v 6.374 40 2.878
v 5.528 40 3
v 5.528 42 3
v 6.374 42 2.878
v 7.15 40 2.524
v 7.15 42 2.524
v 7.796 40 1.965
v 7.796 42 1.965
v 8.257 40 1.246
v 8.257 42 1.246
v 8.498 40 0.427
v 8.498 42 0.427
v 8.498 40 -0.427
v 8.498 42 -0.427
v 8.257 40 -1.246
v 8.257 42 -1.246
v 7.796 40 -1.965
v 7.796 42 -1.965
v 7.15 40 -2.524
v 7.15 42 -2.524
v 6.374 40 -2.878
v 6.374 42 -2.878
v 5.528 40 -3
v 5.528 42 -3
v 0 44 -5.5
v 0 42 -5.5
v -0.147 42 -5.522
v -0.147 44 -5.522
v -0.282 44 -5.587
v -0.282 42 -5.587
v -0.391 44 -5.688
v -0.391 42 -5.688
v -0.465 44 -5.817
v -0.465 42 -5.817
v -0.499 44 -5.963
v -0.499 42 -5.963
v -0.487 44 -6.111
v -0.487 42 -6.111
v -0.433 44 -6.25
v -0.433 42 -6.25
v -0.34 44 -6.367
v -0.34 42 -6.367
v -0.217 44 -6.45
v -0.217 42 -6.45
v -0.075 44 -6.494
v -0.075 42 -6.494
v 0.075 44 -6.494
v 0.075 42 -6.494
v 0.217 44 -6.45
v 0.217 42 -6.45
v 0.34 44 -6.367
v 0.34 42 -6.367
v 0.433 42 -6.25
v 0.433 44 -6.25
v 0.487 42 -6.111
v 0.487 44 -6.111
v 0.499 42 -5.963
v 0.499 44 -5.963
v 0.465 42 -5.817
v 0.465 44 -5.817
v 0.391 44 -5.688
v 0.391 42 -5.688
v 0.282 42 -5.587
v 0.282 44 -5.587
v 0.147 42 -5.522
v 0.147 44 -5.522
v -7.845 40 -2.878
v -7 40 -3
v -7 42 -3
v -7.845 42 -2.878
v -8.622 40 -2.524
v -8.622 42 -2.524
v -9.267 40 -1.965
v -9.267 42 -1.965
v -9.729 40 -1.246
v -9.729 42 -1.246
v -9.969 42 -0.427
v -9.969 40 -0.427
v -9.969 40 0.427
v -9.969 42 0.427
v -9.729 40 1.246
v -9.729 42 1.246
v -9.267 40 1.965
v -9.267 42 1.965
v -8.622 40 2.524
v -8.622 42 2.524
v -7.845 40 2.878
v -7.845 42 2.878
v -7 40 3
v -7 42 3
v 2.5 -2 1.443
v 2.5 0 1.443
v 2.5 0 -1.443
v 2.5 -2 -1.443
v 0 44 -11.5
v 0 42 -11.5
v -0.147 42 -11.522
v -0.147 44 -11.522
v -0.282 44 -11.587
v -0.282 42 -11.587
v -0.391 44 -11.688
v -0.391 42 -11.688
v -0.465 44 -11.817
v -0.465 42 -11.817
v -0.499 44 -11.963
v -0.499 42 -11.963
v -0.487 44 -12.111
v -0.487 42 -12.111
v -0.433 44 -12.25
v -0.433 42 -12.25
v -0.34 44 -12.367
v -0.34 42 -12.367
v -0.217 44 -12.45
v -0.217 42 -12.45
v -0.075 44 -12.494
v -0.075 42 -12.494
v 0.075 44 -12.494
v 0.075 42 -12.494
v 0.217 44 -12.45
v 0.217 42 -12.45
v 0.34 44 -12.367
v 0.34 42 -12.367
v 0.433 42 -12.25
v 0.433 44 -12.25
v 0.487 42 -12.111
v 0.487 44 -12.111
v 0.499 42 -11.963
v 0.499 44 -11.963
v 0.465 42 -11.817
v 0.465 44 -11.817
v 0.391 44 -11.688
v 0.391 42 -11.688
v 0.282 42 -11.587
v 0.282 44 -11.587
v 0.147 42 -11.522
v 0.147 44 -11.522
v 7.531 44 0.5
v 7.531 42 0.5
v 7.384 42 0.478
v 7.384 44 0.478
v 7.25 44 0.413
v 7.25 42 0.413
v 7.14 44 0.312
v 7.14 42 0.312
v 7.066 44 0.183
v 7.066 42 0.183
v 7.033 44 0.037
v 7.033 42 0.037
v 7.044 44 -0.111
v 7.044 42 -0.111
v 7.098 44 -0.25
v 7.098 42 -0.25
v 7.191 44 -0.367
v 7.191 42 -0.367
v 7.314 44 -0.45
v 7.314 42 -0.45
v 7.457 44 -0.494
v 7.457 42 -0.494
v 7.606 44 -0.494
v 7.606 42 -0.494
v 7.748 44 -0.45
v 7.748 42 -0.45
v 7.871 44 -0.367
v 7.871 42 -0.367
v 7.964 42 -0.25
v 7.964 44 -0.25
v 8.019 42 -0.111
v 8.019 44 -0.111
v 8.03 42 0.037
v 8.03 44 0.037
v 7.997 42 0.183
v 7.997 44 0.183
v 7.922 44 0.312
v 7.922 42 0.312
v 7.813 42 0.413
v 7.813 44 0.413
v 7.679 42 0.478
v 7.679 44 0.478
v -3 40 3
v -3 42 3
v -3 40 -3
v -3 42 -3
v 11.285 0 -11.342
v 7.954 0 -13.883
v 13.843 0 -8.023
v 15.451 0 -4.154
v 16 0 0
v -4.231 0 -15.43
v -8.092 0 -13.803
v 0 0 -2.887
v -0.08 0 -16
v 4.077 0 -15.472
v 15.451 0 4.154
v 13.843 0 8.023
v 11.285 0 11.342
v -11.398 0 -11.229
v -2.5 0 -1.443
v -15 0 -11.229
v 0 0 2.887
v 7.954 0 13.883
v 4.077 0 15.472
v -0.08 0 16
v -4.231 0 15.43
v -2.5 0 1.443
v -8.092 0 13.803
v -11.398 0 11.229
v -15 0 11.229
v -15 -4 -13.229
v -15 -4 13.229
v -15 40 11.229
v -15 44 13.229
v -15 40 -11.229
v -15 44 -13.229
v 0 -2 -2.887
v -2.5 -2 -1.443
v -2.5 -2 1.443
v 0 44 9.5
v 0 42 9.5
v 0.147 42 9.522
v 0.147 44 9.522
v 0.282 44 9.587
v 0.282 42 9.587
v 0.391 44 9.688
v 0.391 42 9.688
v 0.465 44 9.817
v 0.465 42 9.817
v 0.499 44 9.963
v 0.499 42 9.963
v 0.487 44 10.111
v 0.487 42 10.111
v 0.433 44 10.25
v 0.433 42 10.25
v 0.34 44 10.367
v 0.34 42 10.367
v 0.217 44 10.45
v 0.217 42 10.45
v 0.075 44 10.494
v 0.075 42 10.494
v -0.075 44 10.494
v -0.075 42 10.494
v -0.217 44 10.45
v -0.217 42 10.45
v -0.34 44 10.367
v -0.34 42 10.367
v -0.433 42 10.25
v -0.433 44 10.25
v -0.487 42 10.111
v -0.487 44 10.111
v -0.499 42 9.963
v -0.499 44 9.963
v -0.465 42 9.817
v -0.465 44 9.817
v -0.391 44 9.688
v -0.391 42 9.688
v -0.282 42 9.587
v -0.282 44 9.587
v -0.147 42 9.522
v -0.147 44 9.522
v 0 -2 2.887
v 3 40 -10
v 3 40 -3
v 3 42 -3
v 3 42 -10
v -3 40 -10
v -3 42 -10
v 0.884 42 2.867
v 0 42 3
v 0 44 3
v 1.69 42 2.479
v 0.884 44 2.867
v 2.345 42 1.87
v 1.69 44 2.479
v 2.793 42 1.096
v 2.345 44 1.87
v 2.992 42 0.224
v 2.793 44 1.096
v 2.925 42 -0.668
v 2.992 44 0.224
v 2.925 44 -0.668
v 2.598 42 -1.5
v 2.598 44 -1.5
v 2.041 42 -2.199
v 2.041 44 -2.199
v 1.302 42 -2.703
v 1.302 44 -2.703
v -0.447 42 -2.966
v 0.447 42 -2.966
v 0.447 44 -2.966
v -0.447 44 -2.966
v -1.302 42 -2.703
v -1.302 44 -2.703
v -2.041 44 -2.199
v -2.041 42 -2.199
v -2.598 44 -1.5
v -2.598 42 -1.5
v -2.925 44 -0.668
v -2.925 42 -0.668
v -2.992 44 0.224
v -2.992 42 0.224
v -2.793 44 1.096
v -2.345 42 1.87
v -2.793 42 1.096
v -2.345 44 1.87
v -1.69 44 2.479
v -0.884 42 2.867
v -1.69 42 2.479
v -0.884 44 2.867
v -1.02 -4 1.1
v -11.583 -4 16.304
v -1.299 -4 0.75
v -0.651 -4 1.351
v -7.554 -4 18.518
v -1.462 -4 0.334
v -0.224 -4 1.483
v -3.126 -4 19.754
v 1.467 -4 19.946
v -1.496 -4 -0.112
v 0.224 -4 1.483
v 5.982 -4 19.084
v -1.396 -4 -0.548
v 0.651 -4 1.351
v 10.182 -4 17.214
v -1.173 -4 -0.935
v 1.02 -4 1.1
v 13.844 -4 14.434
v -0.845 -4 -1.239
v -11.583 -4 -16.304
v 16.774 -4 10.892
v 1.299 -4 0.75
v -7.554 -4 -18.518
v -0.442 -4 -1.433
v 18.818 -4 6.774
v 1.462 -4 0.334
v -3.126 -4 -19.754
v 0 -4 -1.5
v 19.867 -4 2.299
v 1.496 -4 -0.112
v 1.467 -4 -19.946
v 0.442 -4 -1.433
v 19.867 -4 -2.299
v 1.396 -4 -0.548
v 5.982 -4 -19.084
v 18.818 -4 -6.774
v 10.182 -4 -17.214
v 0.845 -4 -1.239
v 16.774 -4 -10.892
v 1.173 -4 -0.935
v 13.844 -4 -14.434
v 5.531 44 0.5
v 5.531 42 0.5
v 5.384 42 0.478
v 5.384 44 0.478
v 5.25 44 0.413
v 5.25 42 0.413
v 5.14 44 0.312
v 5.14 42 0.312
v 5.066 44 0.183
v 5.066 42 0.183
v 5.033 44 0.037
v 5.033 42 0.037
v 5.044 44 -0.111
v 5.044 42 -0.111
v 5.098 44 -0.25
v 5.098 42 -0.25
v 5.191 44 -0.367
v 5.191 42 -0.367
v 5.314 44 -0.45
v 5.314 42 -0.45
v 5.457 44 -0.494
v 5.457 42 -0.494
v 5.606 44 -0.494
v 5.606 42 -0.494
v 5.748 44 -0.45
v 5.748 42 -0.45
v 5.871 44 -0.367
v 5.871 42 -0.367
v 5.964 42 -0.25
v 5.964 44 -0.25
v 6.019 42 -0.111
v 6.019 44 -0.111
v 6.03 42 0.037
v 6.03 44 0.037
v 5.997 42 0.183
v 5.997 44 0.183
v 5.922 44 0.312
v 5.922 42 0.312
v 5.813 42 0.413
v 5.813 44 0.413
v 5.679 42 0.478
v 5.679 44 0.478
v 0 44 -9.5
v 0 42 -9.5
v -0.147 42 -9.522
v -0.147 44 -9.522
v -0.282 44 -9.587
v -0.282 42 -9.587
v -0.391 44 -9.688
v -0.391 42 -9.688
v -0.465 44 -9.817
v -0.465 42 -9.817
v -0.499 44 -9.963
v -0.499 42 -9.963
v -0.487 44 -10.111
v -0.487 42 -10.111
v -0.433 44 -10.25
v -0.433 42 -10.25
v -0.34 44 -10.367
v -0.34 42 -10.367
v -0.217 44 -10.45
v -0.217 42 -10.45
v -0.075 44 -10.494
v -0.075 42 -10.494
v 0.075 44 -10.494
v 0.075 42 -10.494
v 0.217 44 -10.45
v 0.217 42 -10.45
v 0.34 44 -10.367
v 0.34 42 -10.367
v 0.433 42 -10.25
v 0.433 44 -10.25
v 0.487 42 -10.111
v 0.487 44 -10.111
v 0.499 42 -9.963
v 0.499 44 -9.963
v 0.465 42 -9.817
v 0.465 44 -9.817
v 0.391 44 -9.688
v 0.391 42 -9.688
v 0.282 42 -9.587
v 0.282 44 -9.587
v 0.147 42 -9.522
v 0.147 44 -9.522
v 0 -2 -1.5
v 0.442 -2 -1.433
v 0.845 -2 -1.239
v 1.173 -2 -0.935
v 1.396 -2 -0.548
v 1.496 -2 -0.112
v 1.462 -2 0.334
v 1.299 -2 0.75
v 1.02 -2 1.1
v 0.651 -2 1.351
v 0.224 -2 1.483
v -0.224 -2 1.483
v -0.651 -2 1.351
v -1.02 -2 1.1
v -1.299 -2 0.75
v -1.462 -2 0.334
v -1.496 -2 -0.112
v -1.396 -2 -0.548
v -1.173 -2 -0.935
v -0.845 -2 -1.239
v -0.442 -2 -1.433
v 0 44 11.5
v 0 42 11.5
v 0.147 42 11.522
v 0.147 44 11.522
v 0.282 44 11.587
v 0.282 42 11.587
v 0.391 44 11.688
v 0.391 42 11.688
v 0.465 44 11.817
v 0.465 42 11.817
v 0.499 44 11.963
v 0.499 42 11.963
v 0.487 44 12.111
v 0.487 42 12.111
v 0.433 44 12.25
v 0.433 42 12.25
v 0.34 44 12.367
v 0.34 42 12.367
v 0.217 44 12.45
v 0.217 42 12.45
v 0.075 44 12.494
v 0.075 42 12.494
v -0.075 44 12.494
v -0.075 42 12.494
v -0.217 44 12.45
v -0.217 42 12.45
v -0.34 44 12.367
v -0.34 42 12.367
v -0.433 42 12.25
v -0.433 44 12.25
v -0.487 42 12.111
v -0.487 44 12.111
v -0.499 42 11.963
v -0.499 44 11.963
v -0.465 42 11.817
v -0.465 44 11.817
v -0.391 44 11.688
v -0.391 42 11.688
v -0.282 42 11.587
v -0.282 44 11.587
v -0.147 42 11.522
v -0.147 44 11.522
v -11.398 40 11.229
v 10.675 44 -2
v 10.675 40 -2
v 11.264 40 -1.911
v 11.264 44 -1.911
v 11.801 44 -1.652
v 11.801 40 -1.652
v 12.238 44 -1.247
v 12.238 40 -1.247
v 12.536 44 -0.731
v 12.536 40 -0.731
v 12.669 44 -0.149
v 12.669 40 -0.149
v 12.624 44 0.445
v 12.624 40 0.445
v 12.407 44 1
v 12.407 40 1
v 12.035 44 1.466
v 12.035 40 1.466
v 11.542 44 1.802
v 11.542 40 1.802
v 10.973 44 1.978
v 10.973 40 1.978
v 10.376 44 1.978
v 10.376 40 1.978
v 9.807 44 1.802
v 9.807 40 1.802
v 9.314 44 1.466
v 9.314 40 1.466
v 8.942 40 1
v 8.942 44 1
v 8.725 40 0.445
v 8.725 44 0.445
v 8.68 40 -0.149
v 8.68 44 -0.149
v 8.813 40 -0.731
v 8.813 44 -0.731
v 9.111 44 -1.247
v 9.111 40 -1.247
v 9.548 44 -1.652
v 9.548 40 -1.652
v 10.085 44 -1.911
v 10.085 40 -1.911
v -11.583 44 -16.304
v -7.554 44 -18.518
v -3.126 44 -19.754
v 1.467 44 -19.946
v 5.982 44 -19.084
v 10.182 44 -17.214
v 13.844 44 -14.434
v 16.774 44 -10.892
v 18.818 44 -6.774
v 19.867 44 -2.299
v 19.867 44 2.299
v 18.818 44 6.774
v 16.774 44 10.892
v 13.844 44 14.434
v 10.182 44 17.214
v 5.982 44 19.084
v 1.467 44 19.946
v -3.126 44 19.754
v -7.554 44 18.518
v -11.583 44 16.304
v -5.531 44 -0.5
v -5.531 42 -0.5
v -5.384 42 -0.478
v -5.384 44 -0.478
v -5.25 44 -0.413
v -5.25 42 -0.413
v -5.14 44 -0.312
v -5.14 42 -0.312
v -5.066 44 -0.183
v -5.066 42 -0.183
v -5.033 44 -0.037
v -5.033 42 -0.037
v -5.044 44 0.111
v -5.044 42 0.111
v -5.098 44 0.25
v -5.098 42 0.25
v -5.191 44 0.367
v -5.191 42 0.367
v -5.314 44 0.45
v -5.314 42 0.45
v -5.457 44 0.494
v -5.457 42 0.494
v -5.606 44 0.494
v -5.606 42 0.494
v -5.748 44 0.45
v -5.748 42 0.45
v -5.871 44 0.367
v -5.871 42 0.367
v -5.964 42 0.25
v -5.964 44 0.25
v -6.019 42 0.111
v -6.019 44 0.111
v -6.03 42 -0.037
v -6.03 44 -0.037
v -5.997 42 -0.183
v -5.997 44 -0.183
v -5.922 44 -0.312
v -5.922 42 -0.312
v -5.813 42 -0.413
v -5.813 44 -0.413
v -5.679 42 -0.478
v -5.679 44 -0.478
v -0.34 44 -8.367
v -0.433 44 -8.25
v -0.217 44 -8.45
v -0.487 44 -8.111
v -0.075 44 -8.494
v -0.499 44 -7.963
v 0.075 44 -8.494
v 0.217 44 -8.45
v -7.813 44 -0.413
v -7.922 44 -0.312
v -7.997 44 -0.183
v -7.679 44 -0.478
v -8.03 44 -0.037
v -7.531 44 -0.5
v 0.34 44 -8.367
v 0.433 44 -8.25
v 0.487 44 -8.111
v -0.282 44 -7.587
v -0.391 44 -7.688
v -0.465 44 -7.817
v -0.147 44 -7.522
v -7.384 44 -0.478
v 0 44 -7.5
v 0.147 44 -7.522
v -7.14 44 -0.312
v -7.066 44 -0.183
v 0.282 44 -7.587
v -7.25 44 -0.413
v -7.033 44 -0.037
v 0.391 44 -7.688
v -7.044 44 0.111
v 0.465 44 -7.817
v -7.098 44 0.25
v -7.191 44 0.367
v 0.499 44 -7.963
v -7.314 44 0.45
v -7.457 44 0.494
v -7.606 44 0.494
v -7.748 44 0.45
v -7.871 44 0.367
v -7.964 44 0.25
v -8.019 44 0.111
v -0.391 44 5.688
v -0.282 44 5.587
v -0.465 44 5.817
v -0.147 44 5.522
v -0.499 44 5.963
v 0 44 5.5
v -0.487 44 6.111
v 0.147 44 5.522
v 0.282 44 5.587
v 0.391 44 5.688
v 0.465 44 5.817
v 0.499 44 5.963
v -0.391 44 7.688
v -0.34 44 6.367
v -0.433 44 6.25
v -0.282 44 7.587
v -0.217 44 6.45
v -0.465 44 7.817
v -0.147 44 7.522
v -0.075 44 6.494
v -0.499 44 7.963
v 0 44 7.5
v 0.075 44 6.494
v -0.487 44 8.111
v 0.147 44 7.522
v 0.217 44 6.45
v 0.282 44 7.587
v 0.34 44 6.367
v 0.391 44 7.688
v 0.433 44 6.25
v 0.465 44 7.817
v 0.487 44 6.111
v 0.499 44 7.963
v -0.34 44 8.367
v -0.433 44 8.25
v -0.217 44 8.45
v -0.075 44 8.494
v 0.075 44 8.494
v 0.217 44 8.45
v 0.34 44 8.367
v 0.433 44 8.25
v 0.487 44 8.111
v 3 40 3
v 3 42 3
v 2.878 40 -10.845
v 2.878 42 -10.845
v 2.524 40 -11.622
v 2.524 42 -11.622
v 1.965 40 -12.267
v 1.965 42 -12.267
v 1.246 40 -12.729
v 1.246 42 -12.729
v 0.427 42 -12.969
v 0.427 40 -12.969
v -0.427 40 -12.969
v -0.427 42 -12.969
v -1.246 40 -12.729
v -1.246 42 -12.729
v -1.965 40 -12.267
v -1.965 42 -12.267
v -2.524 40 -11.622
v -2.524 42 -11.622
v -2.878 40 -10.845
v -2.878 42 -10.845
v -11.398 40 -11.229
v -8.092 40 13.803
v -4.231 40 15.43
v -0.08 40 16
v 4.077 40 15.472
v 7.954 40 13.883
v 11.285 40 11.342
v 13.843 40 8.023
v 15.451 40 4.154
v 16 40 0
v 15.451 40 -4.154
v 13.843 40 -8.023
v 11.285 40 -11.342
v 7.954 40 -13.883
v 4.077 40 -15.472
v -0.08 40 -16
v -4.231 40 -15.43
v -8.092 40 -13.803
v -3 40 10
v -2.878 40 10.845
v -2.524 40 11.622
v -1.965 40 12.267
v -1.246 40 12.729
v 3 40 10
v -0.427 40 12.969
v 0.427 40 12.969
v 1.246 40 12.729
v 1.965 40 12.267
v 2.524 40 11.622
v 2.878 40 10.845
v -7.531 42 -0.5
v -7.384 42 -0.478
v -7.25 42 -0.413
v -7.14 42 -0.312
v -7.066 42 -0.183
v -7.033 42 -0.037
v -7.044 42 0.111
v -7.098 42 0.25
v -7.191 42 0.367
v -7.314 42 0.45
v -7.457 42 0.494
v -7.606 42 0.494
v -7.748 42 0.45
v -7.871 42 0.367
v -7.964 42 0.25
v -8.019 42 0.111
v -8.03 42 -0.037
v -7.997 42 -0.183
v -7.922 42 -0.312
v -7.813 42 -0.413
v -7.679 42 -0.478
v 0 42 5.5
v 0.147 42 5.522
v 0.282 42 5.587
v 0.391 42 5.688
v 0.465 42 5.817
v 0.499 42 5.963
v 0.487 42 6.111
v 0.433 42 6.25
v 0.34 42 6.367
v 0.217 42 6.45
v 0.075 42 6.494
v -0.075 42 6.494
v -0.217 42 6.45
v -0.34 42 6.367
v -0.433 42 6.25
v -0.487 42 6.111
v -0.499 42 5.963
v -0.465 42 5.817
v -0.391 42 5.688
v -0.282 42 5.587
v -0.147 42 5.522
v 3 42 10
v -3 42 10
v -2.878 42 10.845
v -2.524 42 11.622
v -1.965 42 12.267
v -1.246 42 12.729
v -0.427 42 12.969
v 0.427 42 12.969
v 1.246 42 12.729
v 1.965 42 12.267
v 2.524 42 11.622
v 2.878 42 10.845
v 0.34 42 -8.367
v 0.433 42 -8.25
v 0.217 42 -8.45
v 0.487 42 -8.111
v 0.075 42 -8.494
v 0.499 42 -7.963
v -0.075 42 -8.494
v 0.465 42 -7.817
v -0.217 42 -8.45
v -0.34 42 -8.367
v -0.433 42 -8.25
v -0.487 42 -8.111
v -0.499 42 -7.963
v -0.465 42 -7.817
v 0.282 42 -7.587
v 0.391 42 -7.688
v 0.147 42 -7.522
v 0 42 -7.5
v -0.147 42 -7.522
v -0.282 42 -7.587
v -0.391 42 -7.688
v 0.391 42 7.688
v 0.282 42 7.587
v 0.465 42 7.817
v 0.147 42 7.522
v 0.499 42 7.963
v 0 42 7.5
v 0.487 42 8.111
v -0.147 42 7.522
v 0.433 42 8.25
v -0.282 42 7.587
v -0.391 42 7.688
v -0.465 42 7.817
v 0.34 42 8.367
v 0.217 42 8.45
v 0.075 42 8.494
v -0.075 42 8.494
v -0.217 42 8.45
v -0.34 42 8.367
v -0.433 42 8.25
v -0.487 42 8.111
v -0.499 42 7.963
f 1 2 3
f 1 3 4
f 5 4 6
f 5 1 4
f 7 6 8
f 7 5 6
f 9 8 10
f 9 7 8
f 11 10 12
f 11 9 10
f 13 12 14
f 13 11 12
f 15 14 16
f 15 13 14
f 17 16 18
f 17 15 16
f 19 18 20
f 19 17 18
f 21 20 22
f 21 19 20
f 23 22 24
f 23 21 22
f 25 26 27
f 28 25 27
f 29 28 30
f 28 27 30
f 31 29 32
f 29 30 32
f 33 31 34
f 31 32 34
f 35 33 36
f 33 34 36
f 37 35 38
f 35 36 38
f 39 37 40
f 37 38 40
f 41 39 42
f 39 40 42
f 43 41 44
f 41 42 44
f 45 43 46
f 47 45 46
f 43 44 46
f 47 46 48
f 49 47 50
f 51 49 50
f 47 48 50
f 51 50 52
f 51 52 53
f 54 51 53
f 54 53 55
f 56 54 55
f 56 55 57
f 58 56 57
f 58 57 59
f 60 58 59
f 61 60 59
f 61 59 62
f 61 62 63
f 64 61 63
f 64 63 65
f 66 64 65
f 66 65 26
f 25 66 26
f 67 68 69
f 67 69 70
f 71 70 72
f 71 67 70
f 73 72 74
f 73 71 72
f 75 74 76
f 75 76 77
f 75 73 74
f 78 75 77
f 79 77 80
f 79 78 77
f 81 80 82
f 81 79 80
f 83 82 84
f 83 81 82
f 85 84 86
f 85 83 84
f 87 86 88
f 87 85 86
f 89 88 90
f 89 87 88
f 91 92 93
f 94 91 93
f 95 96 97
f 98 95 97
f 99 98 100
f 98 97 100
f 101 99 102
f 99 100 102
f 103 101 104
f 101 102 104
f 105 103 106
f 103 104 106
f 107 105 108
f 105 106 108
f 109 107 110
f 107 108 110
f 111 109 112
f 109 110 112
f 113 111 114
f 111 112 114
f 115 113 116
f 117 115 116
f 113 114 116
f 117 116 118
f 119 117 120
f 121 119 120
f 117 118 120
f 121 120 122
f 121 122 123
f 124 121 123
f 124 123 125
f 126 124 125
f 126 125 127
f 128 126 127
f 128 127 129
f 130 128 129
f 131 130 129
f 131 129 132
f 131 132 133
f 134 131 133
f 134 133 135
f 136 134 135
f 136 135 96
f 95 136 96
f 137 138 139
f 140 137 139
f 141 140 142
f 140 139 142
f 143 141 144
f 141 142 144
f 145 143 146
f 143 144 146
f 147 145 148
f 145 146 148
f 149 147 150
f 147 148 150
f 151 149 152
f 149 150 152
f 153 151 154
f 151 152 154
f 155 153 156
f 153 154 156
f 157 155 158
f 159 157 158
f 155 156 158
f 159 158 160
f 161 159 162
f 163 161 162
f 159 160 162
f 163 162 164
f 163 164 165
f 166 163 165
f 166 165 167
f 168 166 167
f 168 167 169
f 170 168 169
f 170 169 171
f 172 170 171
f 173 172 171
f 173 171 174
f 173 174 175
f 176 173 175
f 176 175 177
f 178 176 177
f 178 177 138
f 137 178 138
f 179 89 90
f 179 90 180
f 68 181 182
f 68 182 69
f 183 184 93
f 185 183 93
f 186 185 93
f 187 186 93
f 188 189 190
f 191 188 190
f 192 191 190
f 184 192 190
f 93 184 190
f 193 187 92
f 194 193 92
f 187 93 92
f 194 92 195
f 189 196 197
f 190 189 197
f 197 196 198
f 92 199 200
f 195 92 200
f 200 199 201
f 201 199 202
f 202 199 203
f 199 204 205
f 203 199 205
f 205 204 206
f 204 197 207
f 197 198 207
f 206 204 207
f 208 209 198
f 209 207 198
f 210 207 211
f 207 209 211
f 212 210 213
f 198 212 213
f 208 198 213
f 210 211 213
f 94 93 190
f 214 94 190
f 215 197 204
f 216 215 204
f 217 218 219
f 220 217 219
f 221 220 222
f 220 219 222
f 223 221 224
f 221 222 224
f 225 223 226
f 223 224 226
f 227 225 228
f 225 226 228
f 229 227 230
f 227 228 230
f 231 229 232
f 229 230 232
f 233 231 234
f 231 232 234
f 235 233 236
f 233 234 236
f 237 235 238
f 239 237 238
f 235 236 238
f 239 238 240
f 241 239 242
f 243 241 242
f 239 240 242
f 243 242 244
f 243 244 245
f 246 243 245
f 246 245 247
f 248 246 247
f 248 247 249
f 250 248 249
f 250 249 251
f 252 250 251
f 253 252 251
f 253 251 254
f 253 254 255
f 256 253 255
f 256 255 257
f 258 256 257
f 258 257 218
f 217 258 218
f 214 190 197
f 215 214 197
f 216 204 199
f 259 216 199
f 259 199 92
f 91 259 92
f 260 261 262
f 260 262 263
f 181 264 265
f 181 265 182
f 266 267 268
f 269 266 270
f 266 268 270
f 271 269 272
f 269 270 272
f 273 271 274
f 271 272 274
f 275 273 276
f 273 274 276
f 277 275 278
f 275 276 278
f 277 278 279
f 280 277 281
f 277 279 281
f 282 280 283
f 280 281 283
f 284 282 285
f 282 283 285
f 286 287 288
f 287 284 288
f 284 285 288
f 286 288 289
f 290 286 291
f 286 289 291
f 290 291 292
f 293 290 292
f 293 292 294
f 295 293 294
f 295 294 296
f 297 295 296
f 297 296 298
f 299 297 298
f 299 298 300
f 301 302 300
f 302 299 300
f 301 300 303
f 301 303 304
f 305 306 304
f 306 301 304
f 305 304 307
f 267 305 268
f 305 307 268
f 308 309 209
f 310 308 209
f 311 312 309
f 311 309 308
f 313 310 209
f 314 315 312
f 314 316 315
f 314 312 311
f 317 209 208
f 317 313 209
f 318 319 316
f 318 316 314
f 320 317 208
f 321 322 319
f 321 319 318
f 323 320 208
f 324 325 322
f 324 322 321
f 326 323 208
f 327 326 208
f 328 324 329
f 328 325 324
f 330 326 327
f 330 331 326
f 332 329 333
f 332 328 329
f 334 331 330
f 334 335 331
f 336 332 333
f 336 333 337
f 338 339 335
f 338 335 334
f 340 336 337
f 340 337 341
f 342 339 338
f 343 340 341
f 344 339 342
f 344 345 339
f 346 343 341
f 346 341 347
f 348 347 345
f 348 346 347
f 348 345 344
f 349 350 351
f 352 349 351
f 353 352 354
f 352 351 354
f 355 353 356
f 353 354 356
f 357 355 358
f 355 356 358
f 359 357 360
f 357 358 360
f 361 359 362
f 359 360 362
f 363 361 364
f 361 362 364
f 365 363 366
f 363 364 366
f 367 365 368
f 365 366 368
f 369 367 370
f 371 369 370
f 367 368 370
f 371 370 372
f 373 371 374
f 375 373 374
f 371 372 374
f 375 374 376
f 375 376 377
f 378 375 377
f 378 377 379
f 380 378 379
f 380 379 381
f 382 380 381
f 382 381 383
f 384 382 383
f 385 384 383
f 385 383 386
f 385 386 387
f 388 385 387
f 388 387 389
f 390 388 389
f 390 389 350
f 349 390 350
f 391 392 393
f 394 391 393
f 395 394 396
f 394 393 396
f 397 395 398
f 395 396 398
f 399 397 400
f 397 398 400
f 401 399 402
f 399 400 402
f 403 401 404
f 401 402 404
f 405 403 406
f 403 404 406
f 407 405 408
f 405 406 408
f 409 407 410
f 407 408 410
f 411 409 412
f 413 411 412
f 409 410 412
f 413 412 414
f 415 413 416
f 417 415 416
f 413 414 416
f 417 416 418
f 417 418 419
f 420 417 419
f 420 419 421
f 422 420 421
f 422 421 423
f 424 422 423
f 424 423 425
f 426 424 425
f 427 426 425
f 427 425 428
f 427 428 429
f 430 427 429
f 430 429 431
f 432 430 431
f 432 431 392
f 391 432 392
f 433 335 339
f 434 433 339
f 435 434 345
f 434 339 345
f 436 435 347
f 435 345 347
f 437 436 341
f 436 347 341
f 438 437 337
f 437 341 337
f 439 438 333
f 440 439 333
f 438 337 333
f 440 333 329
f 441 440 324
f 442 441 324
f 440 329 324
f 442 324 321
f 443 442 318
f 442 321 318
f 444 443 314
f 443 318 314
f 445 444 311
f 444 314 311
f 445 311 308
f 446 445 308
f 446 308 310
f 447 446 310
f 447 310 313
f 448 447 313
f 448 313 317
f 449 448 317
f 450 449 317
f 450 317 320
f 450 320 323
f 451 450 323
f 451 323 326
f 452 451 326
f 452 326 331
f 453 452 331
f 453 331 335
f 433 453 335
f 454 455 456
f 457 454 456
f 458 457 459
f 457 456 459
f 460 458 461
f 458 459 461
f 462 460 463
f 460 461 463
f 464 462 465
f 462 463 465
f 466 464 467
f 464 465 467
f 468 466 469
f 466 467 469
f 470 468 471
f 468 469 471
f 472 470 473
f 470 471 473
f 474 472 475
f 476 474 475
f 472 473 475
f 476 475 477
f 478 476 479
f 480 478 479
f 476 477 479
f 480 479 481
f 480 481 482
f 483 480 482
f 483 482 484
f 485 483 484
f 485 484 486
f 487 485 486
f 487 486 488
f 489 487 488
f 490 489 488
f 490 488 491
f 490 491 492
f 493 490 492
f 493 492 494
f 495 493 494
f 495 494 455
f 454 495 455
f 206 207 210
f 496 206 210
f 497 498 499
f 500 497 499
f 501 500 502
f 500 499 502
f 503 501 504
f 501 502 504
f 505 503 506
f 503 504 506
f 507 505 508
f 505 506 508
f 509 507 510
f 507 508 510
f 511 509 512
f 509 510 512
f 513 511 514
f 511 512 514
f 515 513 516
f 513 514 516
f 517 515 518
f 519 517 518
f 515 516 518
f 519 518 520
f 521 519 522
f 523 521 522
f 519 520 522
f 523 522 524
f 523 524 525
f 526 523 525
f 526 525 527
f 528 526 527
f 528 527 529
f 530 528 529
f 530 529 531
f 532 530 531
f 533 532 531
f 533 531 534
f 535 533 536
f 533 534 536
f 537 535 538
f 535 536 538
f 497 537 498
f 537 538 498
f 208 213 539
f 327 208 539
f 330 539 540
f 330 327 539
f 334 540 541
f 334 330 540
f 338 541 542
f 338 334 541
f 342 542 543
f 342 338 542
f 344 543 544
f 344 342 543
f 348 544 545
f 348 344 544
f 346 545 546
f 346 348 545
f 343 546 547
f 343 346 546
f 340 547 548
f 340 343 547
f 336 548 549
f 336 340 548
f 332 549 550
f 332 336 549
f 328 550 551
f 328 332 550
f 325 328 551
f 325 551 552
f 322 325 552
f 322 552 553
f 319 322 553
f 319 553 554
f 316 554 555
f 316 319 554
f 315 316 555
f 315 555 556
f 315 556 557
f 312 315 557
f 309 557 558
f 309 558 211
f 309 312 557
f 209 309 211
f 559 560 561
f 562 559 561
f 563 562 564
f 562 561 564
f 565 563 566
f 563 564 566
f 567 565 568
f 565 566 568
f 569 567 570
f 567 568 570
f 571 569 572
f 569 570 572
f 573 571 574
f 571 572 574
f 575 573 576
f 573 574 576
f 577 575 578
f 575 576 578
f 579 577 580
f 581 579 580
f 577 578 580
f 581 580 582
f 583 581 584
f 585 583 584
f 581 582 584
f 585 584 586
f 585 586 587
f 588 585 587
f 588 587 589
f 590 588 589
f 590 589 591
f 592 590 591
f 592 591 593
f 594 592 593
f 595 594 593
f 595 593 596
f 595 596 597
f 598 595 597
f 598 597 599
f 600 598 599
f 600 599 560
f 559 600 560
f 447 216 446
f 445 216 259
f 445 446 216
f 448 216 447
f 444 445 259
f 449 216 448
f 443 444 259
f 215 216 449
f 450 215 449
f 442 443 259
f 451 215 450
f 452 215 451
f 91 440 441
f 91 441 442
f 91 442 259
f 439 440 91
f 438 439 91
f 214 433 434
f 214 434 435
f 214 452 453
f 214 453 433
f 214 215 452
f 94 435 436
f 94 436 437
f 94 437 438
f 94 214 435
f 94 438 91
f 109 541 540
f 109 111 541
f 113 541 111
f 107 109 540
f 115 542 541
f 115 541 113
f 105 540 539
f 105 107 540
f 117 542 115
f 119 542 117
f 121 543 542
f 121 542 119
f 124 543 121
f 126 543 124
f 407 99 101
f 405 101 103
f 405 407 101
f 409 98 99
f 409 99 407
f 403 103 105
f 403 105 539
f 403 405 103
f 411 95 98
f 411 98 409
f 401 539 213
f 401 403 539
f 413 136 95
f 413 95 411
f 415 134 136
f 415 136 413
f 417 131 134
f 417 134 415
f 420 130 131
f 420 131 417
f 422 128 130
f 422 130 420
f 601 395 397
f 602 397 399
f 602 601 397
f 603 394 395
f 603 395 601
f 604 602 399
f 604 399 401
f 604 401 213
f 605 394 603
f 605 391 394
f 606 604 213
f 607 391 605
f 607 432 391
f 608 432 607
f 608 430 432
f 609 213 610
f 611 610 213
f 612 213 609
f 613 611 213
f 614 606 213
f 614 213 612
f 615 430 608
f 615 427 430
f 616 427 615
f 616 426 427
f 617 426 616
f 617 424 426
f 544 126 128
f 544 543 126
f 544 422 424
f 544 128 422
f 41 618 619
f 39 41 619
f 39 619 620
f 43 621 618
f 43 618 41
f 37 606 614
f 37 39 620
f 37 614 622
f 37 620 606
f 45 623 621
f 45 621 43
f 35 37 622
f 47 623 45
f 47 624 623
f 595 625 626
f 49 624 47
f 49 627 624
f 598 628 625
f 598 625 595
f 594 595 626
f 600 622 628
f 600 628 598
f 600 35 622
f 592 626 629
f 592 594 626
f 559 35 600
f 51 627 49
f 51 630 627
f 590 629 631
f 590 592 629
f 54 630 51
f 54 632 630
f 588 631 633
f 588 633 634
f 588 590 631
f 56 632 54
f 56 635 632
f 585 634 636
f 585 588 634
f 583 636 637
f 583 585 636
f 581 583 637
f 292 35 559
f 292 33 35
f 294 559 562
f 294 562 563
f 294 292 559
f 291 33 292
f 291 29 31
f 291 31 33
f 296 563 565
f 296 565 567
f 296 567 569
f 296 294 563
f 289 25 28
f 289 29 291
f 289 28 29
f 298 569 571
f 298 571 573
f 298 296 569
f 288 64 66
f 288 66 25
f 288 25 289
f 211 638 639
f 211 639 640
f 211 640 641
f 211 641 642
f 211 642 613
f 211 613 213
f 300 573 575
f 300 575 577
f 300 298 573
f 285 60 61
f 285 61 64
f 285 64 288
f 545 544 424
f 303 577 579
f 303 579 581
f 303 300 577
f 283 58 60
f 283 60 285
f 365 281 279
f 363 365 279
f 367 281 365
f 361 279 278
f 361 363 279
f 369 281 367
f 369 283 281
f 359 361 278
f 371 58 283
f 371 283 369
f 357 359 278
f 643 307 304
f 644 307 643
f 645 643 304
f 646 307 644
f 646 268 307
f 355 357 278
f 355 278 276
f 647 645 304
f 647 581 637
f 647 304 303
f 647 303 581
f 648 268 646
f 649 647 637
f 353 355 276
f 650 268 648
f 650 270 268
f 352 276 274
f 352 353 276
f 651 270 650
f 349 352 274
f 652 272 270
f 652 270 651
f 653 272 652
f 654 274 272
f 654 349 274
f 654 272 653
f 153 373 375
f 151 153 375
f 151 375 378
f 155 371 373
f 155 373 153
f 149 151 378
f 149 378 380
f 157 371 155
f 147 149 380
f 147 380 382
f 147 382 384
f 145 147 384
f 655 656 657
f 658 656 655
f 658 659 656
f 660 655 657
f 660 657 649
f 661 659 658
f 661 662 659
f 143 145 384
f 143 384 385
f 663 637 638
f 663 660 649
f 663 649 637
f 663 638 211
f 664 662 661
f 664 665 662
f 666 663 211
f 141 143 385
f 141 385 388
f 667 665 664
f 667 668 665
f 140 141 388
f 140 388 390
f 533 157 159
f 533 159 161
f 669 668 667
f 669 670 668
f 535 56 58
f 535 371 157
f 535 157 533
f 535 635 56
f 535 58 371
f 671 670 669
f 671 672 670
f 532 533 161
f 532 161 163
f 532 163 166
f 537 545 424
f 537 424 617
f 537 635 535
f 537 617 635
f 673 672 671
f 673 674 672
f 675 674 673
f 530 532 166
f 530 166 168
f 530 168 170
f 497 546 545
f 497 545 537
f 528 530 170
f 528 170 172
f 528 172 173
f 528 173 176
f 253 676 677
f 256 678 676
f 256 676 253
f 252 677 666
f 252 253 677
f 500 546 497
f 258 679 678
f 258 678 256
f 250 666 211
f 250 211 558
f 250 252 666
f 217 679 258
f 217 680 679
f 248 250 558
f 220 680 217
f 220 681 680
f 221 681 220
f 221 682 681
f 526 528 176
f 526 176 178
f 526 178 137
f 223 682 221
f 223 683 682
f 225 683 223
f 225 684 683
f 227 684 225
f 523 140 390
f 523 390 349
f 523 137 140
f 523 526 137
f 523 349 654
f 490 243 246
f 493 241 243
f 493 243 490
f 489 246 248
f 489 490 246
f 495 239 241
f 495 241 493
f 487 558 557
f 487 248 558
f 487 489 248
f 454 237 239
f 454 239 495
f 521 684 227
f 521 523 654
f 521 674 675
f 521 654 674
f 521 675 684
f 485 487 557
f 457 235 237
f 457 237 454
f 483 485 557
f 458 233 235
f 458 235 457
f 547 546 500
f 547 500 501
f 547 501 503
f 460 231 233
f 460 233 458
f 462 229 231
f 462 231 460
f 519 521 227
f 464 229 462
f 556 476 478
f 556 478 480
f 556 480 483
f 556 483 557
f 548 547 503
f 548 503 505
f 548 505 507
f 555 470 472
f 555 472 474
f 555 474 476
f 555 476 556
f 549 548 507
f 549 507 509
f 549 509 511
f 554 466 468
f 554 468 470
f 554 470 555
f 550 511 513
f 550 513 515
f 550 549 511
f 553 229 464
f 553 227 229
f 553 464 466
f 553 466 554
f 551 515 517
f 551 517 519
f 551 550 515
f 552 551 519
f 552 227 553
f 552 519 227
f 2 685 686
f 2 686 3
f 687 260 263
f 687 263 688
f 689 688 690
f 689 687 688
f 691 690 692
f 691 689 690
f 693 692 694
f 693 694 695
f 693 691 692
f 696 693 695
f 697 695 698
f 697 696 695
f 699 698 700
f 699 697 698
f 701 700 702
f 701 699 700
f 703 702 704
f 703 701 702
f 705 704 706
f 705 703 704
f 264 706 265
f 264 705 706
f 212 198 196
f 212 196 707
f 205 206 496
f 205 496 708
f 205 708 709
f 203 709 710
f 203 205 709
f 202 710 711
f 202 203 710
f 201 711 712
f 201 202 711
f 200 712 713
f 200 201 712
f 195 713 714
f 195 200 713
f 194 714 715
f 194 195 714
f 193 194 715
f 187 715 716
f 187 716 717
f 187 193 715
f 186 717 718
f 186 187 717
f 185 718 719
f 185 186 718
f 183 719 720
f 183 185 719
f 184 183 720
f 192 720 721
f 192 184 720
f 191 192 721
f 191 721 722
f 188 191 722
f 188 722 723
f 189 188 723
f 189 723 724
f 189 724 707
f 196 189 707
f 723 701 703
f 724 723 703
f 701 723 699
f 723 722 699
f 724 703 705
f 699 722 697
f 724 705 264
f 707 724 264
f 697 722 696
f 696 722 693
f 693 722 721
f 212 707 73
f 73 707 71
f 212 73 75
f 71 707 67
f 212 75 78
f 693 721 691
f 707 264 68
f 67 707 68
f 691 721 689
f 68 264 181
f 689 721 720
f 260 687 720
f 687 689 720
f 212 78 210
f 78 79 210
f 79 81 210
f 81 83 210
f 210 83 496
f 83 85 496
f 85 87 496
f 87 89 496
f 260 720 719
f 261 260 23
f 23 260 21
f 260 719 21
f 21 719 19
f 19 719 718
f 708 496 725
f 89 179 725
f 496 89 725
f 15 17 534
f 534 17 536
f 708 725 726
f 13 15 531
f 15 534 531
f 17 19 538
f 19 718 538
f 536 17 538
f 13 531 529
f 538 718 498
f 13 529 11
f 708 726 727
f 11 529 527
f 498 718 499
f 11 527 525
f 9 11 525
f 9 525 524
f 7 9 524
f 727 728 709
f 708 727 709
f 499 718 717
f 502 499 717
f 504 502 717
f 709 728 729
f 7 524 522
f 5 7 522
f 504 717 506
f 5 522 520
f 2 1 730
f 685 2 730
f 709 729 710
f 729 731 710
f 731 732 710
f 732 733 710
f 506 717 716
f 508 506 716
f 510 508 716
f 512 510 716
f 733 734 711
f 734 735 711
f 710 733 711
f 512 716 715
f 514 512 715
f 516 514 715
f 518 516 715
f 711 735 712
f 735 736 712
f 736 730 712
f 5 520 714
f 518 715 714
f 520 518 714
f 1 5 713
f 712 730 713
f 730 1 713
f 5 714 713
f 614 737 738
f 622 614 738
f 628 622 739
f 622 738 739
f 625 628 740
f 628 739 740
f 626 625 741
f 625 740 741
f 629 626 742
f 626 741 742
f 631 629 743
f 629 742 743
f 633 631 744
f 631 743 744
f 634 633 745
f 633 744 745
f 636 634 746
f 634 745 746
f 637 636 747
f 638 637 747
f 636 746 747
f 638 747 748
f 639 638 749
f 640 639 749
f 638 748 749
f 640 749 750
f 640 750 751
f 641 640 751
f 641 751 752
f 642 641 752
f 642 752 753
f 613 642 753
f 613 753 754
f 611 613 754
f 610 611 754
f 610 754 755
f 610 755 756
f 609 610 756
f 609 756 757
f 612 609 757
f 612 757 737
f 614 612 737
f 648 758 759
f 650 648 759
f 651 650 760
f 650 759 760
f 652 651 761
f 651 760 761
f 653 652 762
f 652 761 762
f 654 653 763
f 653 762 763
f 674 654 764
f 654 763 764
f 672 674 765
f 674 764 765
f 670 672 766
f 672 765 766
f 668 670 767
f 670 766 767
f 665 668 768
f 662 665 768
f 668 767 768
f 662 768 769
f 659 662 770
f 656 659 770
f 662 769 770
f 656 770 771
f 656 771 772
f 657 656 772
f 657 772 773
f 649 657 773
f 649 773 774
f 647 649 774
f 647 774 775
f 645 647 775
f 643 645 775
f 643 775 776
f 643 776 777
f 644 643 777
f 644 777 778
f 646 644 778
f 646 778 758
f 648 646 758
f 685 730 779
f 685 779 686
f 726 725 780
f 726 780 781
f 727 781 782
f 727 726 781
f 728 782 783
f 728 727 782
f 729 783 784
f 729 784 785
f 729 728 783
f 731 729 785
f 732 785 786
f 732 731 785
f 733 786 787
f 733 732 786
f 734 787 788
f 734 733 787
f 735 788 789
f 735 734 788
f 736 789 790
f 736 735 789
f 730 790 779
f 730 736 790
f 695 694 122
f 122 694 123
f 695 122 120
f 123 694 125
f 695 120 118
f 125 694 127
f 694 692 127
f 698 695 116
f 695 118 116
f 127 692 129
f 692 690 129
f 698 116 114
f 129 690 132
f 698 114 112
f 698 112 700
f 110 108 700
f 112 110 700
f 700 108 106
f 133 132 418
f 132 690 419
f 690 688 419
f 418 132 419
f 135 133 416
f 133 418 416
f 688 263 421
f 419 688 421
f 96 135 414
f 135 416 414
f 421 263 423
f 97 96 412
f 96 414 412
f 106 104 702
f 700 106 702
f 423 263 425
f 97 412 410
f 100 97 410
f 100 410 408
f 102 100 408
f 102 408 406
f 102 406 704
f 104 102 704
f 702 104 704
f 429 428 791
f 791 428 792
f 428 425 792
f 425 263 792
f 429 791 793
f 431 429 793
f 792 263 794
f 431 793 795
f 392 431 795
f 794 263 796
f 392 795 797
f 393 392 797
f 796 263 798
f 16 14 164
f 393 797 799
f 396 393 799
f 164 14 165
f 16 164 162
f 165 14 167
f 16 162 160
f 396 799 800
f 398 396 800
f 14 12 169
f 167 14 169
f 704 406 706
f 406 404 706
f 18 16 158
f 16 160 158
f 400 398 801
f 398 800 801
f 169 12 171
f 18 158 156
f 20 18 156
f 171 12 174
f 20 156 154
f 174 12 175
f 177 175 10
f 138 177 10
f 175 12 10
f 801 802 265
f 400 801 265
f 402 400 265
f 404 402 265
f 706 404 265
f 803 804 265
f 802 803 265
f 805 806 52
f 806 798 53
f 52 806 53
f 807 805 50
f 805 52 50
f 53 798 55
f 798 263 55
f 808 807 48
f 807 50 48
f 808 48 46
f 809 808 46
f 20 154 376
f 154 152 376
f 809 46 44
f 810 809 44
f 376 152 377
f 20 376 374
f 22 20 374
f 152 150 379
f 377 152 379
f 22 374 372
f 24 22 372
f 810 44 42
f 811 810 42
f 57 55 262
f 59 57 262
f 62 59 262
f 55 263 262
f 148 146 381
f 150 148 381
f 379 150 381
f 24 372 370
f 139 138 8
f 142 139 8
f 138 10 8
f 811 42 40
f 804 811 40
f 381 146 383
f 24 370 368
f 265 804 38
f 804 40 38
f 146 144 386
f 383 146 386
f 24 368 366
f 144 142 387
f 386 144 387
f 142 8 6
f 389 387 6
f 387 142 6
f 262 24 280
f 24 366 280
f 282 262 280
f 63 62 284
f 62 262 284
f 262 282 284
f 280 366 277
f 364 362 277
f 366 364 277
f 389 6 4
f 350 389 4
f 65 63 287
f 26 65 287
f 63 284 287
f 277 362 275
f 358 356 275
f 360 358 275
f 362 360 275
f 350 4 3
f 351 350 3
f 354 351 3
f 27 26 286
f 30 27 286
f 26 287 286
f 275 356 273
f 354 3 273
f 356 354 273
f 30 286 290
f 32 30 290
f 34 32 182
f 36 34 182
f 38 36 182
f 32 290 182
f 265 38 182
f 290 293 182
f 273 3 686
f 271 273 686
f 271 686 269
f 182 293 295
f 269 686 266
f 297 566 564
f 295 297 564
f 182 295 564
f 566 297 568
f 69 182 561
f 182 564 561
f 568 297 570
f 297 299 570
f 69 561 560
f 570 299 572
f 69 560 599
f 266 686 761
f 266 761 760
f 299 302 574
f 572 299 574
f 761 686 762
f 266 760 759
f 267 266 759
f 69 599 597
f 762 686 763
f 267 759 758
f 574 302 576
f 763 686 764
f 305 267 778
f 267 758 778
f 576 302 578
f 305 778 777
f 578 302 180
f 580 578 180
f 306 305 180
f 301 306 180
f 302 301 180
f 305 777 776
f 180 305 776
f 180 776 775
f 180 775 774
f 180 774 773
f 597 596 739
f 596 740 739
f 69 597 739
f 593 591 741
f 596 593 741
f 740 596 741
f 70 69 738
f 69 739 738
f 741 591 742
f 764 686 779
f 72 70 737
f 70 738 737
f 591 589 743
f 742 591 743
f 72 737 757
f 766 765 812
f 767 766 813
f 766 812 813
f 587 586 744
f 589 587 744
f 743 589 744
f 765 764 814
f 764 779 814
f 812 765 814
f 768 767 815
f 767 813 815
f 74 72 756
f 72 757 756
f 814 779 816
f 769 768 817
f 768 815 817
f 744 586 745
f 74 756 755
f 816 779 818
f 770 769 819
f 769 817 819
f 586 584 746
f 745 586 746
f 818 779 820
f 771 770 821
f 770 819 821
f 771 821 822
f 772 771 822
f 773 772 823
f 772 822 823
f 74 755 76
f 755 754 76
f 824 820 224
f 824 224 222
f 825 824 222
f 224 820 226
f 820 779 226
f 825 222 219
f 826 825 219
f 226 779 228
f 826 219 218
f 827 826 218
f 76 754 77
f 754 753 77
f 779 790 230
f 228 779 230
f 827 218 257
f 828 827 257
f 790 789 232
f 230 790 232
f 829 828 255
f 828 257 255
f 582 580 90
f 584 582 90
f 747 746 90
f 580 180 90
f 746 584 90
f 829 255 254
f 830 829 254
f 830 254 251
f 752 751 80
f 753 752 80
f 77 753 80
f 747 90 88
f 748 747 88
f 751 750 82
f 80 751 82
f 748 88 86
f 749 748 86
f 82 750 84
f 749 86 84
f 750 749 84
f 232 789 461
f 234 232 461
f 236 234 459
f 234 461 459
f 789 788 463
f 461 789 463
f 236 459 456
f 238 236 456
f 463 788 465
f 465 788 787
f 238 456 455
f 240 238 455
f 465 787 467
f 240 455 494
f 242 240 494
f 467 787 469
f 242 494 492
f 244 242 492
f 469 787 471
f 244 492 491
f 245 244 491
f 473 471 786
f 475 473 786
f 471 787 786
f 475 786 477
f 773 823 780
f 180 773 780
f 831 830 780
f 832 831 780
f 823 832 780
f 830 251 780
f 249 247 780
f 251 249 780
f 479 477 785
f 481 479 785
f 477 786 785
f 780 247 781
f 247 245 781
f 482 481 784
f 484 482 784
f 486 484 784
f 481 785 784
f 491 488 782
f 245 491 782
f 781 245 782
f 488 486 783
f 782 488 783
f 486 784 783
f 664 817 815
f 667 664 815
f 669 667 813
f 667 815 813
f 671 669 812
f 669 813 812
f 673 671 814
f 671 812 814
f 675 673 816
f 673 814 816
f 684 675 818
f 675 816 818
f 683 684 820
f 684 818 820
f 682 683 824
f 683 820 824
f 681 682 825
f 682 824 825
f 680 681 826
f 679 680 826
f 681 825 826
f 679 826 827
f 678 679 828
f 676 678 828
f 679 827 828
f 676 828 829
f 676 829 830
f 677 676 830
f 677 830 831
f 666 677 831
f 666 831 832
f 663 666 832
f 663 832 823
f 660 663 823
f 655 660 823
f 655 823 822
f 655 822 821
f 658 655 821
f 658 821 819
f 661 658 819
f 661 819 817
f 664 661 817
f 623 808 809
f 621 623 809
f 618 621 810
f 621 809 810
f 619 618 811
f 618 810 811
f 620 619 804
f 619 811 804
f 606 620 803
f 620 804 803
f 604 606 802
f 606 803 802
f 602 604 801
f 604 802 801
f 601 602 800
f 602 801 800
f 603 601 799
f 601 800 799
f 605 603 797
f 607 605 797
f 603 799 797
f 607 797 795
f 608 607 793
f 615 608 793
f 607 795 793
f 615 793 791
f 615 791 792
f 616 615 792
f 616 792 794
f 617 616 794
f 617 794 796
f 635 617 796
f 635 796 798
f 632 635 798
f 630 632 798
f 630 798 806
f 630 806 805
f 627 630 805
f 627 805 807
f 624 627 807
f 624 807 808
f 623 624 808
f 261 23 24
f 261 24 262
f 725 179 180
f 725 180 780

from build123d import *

# Parameters (mm, degrees)
SKETCH_1_R           = 20
SKETCH_1_R_2         = 16
EXTRUDE_1_DEPTH      = 40
SKETCH_2_R           = 20
EXTRUDE_2_DEPTH      = 4
SKETCH_3_R           = 3
CUT_EXTRUDE_1_DEPTH  = 4
CUT_EXTRUDE_2_DEPTH  = 2
EXTRUDE_START        = 4
SKETCH_7_R           = 20
EXTRUDE_3_DEPTH      = 4
SKETCH_8_R           = 1.5
CUT_EXTRUDE_4_DEPTH  = 6
SKETCH_10_W          = 10
SKETCH_10_H          = 30
CUT_EXTRUDE_6_DEPTH  = 48
SKETCH_11_W          = 22.45751311
SKETCH_11_H          = 40
CUT_EXTRUDE_9_DEPTH  = 25
CUT_EXTRUDE_10_DEPTH = 2
SKETCH_14_R          = 2
CUT_EXTRUDE_11_DEPTH = 4
CUT_EXTRUDE_12_DEPTH = 2
SKETCH_16_R          = 0.5
CUT_EXTRUDE_13_DEPTH = 55


with BuildPart() as part:
    # 草图1 → 凸台-拉伸1 (new body)
    with BuildSketch(Plane(origin=(0, 0, 0), x_dir=(1, 0, 0), z_dir=(0, 1, 0))):
        with Locations(Location((0, 0, 0), (0, 0, 270))):
            Circle(SKETCH_1_R)
        with Locations(Location((0, 0, 0), (0, 0, 270))):
            Circle(SKETCH_1_R_2, mode=Mode.SUBTRACT)
    extrude(amount=EXTRUDE_1_DEPTH)

    # 草图2 → 凸台-拉伸2 (add)
    with BuildSketch(Plane(origin=(0, 40, 0), x_dir=(1, 0, 0), z_dir=(0, 1, 0))):
        with Locations(Location((0, 0, 0), (0, 0, 270))):
            Circle(SKETCH_2_R)
    extrude(amount=EXTRUDE_2_DEPTH)

    # 草图3 → 切除-拉伸1 (cut)
    with BuildSketch(Plane(origin=(0, 44, 0), x_dir=(1, 0, 0), z_dir=(0, 1, 0))):
        with Locations(Location((0, 0, 0), (0, 0, 270))):
            Circle(SKETCH_3_R)
    extrude(amount=-CUT_EXTRUDE_1_DEPTH, mode=Mode.SUBTRACT)

    # 草图5 → 切除-拉伸2 (cut)
    with BuildSketch(Plane.XZ.offset(-40)):
        with BuildLine():
            Line((3, 10), (3, -10))
            ThreePointArc((3, -10), (0, -13), (-3, -10))
            Line((-3, -10), (-3, 10))
            ThreePointArc((-3, 10), (0, 13), (3, 10))
        make_face()
    extrude(amount=-CUT_EXTRUDE_2_DEPTH, mode=Mode.SUBTRACT)

    # 草图7 → 凸台-拉伸3 (add)
    with BuildSketch(Plane.XZ.offset(EXTRUDE_START)):
        with Locations(Location((0, 0, 0), (0, 0, 270))):
            Circle(SKETCH_7_R)
    extrude(amount=-EXTRUDE_3_DEPTH)

    # 草图8 → 切除-拉伸4 (cut)
    with BuildSketch(Plane.XZ.offset(4)):
        with Locations(Location((0, 0, 0), (0, 0, 270))):
            Circle(SKETCH_8_R)
    extrude(amount=-CUT_EXTRUDE_4_DEPTH, mode=Mode.SUBTRACT)

    # 草图10 → 切除-拉伸6 (cut)
    with BuildSketch(Plane(origin=(0, 44, 0), x_dir=(1, 0, 0), z_dir=(0, 1, 0))):
        with Locations((-20, 0)):
            Rectangle(SKETCH_10_W, SKETCH_10_H)
    extrude(amount=-CUT_EXTRUDE_6_DEPTH, mode=Mode.SUBTRACT)

    # 草图11 → 切除-拉伸9 (cut)
    with BuildSketch(Plane.ZY.offset(15)):
        with Locations((0, 20)):
            Rectangle(SKETCH_11_W, SKETCH_11_H)
    extrude(amount=-CUT_EXTRUDE_9_DEPTH, mode=Mode.SUBTRACT)

    # 草图12 → 切除-拉伸10 (cut)
    with BuildSketch(Plane(origin=(0, 0, 0), x_dir=(1, 0, 0), z_dir=(0, 1, 0))):
        Polygon((0, 2.886751346), (-2.5, 1.443375673), (-2.5, -1.443375673), (0, -2.886751346), (2.5, -1.443375673), (2.5, 1.443375673), align=None)
    extrude(amount=-CUT_EXTRUDE_10_DEPTH, mode=Mode.SUBTRACT)

    # 草图14 → 切除-拉伸11 (cut)
    with BuildSketch(Plane.XZ.offset(-40)):
        with Locations(Location((10.674541512, 0, 0), (0, 0, 270))):
            Circle(SKETCH_14_R)
    extrude(amount=-CUT_EXTRUDE_11_DEPTH, mode=Mode.SUBTRACT)

    # 草图15 → 切除-拉伸12 (cut)
    with BuildSketch(Plane.XZ.offset(-40)):
        with BuildLine():
            Line((-7, 3), (5.528448646, 3))
            ThreePointArc((5.528448646, 3), (8.528448646, 0), (5.528448646, -3))
            Line((5.528448646, -3), (-7, -3))
            ThreePointArc((-7, -3), (-10, 0), (-7, 3))
        make_face()
    extrude(amount=-CUT_EXTRUDE_12_DEPTH, mode=Mode.SUBTRACT)

    # 草图16 → 切除-拉伸13 (cut, through all)
    with BuildSketch(Plane.XZ.offset(-42)):
        with Locations(Location((0, 12, 0), (0, 0, 270))):
            Circle(SKETCH_16_R)
        with Locations(Location((0, 10, 0), (0, 0, 270))):
            Circle(SKETCH_16_R)
        with Locations(Location((0, 8, 0), (0, 0, 270))):
            Circle(SKETCH_16_R)
        with Locations(Location((0, 6, 0), (0, 0, 270))):
            Circle(SKETCH_16_R)
        with Locations(Location((-7.531348858, 0, 0), (0, 0, 270))):
            Circle(SKETCH_16_R)
        with Locations(Location((-5.531348858, 0, 0), (0, 0, 270))):
            Circle(SKETCH_16_R)
        with Locations(Location((5.531348858, 0, 0), (0, 0, 90))):
            Circle(SKETCH_16_R)
        with Locations(Location((7.531348858, 0, 0), (0, 0, 90))):
            Circle(SKETCH_16_R)
        with Locations(Location((0, -6, 0), (0, 0, 90))):
            Circle(SKETCH_16_R)
        with Locations(Location((0, -8, 0), (0, 0, 90))):
            Circle(SKETCH_16_R)
        with Locations(Location((0, -10, 0), (0, 0, 90))):
            Circle(SKETCH_16_R)
        with Locations(Location((0, -12, 0), (0, 0, 90))):
            Circle(SKETCH_16_R)
    extrude(amount=-CUT_EXTRUDE_13_DEPTH, mode=Mode.SUBTRACT)


solid = part.part
